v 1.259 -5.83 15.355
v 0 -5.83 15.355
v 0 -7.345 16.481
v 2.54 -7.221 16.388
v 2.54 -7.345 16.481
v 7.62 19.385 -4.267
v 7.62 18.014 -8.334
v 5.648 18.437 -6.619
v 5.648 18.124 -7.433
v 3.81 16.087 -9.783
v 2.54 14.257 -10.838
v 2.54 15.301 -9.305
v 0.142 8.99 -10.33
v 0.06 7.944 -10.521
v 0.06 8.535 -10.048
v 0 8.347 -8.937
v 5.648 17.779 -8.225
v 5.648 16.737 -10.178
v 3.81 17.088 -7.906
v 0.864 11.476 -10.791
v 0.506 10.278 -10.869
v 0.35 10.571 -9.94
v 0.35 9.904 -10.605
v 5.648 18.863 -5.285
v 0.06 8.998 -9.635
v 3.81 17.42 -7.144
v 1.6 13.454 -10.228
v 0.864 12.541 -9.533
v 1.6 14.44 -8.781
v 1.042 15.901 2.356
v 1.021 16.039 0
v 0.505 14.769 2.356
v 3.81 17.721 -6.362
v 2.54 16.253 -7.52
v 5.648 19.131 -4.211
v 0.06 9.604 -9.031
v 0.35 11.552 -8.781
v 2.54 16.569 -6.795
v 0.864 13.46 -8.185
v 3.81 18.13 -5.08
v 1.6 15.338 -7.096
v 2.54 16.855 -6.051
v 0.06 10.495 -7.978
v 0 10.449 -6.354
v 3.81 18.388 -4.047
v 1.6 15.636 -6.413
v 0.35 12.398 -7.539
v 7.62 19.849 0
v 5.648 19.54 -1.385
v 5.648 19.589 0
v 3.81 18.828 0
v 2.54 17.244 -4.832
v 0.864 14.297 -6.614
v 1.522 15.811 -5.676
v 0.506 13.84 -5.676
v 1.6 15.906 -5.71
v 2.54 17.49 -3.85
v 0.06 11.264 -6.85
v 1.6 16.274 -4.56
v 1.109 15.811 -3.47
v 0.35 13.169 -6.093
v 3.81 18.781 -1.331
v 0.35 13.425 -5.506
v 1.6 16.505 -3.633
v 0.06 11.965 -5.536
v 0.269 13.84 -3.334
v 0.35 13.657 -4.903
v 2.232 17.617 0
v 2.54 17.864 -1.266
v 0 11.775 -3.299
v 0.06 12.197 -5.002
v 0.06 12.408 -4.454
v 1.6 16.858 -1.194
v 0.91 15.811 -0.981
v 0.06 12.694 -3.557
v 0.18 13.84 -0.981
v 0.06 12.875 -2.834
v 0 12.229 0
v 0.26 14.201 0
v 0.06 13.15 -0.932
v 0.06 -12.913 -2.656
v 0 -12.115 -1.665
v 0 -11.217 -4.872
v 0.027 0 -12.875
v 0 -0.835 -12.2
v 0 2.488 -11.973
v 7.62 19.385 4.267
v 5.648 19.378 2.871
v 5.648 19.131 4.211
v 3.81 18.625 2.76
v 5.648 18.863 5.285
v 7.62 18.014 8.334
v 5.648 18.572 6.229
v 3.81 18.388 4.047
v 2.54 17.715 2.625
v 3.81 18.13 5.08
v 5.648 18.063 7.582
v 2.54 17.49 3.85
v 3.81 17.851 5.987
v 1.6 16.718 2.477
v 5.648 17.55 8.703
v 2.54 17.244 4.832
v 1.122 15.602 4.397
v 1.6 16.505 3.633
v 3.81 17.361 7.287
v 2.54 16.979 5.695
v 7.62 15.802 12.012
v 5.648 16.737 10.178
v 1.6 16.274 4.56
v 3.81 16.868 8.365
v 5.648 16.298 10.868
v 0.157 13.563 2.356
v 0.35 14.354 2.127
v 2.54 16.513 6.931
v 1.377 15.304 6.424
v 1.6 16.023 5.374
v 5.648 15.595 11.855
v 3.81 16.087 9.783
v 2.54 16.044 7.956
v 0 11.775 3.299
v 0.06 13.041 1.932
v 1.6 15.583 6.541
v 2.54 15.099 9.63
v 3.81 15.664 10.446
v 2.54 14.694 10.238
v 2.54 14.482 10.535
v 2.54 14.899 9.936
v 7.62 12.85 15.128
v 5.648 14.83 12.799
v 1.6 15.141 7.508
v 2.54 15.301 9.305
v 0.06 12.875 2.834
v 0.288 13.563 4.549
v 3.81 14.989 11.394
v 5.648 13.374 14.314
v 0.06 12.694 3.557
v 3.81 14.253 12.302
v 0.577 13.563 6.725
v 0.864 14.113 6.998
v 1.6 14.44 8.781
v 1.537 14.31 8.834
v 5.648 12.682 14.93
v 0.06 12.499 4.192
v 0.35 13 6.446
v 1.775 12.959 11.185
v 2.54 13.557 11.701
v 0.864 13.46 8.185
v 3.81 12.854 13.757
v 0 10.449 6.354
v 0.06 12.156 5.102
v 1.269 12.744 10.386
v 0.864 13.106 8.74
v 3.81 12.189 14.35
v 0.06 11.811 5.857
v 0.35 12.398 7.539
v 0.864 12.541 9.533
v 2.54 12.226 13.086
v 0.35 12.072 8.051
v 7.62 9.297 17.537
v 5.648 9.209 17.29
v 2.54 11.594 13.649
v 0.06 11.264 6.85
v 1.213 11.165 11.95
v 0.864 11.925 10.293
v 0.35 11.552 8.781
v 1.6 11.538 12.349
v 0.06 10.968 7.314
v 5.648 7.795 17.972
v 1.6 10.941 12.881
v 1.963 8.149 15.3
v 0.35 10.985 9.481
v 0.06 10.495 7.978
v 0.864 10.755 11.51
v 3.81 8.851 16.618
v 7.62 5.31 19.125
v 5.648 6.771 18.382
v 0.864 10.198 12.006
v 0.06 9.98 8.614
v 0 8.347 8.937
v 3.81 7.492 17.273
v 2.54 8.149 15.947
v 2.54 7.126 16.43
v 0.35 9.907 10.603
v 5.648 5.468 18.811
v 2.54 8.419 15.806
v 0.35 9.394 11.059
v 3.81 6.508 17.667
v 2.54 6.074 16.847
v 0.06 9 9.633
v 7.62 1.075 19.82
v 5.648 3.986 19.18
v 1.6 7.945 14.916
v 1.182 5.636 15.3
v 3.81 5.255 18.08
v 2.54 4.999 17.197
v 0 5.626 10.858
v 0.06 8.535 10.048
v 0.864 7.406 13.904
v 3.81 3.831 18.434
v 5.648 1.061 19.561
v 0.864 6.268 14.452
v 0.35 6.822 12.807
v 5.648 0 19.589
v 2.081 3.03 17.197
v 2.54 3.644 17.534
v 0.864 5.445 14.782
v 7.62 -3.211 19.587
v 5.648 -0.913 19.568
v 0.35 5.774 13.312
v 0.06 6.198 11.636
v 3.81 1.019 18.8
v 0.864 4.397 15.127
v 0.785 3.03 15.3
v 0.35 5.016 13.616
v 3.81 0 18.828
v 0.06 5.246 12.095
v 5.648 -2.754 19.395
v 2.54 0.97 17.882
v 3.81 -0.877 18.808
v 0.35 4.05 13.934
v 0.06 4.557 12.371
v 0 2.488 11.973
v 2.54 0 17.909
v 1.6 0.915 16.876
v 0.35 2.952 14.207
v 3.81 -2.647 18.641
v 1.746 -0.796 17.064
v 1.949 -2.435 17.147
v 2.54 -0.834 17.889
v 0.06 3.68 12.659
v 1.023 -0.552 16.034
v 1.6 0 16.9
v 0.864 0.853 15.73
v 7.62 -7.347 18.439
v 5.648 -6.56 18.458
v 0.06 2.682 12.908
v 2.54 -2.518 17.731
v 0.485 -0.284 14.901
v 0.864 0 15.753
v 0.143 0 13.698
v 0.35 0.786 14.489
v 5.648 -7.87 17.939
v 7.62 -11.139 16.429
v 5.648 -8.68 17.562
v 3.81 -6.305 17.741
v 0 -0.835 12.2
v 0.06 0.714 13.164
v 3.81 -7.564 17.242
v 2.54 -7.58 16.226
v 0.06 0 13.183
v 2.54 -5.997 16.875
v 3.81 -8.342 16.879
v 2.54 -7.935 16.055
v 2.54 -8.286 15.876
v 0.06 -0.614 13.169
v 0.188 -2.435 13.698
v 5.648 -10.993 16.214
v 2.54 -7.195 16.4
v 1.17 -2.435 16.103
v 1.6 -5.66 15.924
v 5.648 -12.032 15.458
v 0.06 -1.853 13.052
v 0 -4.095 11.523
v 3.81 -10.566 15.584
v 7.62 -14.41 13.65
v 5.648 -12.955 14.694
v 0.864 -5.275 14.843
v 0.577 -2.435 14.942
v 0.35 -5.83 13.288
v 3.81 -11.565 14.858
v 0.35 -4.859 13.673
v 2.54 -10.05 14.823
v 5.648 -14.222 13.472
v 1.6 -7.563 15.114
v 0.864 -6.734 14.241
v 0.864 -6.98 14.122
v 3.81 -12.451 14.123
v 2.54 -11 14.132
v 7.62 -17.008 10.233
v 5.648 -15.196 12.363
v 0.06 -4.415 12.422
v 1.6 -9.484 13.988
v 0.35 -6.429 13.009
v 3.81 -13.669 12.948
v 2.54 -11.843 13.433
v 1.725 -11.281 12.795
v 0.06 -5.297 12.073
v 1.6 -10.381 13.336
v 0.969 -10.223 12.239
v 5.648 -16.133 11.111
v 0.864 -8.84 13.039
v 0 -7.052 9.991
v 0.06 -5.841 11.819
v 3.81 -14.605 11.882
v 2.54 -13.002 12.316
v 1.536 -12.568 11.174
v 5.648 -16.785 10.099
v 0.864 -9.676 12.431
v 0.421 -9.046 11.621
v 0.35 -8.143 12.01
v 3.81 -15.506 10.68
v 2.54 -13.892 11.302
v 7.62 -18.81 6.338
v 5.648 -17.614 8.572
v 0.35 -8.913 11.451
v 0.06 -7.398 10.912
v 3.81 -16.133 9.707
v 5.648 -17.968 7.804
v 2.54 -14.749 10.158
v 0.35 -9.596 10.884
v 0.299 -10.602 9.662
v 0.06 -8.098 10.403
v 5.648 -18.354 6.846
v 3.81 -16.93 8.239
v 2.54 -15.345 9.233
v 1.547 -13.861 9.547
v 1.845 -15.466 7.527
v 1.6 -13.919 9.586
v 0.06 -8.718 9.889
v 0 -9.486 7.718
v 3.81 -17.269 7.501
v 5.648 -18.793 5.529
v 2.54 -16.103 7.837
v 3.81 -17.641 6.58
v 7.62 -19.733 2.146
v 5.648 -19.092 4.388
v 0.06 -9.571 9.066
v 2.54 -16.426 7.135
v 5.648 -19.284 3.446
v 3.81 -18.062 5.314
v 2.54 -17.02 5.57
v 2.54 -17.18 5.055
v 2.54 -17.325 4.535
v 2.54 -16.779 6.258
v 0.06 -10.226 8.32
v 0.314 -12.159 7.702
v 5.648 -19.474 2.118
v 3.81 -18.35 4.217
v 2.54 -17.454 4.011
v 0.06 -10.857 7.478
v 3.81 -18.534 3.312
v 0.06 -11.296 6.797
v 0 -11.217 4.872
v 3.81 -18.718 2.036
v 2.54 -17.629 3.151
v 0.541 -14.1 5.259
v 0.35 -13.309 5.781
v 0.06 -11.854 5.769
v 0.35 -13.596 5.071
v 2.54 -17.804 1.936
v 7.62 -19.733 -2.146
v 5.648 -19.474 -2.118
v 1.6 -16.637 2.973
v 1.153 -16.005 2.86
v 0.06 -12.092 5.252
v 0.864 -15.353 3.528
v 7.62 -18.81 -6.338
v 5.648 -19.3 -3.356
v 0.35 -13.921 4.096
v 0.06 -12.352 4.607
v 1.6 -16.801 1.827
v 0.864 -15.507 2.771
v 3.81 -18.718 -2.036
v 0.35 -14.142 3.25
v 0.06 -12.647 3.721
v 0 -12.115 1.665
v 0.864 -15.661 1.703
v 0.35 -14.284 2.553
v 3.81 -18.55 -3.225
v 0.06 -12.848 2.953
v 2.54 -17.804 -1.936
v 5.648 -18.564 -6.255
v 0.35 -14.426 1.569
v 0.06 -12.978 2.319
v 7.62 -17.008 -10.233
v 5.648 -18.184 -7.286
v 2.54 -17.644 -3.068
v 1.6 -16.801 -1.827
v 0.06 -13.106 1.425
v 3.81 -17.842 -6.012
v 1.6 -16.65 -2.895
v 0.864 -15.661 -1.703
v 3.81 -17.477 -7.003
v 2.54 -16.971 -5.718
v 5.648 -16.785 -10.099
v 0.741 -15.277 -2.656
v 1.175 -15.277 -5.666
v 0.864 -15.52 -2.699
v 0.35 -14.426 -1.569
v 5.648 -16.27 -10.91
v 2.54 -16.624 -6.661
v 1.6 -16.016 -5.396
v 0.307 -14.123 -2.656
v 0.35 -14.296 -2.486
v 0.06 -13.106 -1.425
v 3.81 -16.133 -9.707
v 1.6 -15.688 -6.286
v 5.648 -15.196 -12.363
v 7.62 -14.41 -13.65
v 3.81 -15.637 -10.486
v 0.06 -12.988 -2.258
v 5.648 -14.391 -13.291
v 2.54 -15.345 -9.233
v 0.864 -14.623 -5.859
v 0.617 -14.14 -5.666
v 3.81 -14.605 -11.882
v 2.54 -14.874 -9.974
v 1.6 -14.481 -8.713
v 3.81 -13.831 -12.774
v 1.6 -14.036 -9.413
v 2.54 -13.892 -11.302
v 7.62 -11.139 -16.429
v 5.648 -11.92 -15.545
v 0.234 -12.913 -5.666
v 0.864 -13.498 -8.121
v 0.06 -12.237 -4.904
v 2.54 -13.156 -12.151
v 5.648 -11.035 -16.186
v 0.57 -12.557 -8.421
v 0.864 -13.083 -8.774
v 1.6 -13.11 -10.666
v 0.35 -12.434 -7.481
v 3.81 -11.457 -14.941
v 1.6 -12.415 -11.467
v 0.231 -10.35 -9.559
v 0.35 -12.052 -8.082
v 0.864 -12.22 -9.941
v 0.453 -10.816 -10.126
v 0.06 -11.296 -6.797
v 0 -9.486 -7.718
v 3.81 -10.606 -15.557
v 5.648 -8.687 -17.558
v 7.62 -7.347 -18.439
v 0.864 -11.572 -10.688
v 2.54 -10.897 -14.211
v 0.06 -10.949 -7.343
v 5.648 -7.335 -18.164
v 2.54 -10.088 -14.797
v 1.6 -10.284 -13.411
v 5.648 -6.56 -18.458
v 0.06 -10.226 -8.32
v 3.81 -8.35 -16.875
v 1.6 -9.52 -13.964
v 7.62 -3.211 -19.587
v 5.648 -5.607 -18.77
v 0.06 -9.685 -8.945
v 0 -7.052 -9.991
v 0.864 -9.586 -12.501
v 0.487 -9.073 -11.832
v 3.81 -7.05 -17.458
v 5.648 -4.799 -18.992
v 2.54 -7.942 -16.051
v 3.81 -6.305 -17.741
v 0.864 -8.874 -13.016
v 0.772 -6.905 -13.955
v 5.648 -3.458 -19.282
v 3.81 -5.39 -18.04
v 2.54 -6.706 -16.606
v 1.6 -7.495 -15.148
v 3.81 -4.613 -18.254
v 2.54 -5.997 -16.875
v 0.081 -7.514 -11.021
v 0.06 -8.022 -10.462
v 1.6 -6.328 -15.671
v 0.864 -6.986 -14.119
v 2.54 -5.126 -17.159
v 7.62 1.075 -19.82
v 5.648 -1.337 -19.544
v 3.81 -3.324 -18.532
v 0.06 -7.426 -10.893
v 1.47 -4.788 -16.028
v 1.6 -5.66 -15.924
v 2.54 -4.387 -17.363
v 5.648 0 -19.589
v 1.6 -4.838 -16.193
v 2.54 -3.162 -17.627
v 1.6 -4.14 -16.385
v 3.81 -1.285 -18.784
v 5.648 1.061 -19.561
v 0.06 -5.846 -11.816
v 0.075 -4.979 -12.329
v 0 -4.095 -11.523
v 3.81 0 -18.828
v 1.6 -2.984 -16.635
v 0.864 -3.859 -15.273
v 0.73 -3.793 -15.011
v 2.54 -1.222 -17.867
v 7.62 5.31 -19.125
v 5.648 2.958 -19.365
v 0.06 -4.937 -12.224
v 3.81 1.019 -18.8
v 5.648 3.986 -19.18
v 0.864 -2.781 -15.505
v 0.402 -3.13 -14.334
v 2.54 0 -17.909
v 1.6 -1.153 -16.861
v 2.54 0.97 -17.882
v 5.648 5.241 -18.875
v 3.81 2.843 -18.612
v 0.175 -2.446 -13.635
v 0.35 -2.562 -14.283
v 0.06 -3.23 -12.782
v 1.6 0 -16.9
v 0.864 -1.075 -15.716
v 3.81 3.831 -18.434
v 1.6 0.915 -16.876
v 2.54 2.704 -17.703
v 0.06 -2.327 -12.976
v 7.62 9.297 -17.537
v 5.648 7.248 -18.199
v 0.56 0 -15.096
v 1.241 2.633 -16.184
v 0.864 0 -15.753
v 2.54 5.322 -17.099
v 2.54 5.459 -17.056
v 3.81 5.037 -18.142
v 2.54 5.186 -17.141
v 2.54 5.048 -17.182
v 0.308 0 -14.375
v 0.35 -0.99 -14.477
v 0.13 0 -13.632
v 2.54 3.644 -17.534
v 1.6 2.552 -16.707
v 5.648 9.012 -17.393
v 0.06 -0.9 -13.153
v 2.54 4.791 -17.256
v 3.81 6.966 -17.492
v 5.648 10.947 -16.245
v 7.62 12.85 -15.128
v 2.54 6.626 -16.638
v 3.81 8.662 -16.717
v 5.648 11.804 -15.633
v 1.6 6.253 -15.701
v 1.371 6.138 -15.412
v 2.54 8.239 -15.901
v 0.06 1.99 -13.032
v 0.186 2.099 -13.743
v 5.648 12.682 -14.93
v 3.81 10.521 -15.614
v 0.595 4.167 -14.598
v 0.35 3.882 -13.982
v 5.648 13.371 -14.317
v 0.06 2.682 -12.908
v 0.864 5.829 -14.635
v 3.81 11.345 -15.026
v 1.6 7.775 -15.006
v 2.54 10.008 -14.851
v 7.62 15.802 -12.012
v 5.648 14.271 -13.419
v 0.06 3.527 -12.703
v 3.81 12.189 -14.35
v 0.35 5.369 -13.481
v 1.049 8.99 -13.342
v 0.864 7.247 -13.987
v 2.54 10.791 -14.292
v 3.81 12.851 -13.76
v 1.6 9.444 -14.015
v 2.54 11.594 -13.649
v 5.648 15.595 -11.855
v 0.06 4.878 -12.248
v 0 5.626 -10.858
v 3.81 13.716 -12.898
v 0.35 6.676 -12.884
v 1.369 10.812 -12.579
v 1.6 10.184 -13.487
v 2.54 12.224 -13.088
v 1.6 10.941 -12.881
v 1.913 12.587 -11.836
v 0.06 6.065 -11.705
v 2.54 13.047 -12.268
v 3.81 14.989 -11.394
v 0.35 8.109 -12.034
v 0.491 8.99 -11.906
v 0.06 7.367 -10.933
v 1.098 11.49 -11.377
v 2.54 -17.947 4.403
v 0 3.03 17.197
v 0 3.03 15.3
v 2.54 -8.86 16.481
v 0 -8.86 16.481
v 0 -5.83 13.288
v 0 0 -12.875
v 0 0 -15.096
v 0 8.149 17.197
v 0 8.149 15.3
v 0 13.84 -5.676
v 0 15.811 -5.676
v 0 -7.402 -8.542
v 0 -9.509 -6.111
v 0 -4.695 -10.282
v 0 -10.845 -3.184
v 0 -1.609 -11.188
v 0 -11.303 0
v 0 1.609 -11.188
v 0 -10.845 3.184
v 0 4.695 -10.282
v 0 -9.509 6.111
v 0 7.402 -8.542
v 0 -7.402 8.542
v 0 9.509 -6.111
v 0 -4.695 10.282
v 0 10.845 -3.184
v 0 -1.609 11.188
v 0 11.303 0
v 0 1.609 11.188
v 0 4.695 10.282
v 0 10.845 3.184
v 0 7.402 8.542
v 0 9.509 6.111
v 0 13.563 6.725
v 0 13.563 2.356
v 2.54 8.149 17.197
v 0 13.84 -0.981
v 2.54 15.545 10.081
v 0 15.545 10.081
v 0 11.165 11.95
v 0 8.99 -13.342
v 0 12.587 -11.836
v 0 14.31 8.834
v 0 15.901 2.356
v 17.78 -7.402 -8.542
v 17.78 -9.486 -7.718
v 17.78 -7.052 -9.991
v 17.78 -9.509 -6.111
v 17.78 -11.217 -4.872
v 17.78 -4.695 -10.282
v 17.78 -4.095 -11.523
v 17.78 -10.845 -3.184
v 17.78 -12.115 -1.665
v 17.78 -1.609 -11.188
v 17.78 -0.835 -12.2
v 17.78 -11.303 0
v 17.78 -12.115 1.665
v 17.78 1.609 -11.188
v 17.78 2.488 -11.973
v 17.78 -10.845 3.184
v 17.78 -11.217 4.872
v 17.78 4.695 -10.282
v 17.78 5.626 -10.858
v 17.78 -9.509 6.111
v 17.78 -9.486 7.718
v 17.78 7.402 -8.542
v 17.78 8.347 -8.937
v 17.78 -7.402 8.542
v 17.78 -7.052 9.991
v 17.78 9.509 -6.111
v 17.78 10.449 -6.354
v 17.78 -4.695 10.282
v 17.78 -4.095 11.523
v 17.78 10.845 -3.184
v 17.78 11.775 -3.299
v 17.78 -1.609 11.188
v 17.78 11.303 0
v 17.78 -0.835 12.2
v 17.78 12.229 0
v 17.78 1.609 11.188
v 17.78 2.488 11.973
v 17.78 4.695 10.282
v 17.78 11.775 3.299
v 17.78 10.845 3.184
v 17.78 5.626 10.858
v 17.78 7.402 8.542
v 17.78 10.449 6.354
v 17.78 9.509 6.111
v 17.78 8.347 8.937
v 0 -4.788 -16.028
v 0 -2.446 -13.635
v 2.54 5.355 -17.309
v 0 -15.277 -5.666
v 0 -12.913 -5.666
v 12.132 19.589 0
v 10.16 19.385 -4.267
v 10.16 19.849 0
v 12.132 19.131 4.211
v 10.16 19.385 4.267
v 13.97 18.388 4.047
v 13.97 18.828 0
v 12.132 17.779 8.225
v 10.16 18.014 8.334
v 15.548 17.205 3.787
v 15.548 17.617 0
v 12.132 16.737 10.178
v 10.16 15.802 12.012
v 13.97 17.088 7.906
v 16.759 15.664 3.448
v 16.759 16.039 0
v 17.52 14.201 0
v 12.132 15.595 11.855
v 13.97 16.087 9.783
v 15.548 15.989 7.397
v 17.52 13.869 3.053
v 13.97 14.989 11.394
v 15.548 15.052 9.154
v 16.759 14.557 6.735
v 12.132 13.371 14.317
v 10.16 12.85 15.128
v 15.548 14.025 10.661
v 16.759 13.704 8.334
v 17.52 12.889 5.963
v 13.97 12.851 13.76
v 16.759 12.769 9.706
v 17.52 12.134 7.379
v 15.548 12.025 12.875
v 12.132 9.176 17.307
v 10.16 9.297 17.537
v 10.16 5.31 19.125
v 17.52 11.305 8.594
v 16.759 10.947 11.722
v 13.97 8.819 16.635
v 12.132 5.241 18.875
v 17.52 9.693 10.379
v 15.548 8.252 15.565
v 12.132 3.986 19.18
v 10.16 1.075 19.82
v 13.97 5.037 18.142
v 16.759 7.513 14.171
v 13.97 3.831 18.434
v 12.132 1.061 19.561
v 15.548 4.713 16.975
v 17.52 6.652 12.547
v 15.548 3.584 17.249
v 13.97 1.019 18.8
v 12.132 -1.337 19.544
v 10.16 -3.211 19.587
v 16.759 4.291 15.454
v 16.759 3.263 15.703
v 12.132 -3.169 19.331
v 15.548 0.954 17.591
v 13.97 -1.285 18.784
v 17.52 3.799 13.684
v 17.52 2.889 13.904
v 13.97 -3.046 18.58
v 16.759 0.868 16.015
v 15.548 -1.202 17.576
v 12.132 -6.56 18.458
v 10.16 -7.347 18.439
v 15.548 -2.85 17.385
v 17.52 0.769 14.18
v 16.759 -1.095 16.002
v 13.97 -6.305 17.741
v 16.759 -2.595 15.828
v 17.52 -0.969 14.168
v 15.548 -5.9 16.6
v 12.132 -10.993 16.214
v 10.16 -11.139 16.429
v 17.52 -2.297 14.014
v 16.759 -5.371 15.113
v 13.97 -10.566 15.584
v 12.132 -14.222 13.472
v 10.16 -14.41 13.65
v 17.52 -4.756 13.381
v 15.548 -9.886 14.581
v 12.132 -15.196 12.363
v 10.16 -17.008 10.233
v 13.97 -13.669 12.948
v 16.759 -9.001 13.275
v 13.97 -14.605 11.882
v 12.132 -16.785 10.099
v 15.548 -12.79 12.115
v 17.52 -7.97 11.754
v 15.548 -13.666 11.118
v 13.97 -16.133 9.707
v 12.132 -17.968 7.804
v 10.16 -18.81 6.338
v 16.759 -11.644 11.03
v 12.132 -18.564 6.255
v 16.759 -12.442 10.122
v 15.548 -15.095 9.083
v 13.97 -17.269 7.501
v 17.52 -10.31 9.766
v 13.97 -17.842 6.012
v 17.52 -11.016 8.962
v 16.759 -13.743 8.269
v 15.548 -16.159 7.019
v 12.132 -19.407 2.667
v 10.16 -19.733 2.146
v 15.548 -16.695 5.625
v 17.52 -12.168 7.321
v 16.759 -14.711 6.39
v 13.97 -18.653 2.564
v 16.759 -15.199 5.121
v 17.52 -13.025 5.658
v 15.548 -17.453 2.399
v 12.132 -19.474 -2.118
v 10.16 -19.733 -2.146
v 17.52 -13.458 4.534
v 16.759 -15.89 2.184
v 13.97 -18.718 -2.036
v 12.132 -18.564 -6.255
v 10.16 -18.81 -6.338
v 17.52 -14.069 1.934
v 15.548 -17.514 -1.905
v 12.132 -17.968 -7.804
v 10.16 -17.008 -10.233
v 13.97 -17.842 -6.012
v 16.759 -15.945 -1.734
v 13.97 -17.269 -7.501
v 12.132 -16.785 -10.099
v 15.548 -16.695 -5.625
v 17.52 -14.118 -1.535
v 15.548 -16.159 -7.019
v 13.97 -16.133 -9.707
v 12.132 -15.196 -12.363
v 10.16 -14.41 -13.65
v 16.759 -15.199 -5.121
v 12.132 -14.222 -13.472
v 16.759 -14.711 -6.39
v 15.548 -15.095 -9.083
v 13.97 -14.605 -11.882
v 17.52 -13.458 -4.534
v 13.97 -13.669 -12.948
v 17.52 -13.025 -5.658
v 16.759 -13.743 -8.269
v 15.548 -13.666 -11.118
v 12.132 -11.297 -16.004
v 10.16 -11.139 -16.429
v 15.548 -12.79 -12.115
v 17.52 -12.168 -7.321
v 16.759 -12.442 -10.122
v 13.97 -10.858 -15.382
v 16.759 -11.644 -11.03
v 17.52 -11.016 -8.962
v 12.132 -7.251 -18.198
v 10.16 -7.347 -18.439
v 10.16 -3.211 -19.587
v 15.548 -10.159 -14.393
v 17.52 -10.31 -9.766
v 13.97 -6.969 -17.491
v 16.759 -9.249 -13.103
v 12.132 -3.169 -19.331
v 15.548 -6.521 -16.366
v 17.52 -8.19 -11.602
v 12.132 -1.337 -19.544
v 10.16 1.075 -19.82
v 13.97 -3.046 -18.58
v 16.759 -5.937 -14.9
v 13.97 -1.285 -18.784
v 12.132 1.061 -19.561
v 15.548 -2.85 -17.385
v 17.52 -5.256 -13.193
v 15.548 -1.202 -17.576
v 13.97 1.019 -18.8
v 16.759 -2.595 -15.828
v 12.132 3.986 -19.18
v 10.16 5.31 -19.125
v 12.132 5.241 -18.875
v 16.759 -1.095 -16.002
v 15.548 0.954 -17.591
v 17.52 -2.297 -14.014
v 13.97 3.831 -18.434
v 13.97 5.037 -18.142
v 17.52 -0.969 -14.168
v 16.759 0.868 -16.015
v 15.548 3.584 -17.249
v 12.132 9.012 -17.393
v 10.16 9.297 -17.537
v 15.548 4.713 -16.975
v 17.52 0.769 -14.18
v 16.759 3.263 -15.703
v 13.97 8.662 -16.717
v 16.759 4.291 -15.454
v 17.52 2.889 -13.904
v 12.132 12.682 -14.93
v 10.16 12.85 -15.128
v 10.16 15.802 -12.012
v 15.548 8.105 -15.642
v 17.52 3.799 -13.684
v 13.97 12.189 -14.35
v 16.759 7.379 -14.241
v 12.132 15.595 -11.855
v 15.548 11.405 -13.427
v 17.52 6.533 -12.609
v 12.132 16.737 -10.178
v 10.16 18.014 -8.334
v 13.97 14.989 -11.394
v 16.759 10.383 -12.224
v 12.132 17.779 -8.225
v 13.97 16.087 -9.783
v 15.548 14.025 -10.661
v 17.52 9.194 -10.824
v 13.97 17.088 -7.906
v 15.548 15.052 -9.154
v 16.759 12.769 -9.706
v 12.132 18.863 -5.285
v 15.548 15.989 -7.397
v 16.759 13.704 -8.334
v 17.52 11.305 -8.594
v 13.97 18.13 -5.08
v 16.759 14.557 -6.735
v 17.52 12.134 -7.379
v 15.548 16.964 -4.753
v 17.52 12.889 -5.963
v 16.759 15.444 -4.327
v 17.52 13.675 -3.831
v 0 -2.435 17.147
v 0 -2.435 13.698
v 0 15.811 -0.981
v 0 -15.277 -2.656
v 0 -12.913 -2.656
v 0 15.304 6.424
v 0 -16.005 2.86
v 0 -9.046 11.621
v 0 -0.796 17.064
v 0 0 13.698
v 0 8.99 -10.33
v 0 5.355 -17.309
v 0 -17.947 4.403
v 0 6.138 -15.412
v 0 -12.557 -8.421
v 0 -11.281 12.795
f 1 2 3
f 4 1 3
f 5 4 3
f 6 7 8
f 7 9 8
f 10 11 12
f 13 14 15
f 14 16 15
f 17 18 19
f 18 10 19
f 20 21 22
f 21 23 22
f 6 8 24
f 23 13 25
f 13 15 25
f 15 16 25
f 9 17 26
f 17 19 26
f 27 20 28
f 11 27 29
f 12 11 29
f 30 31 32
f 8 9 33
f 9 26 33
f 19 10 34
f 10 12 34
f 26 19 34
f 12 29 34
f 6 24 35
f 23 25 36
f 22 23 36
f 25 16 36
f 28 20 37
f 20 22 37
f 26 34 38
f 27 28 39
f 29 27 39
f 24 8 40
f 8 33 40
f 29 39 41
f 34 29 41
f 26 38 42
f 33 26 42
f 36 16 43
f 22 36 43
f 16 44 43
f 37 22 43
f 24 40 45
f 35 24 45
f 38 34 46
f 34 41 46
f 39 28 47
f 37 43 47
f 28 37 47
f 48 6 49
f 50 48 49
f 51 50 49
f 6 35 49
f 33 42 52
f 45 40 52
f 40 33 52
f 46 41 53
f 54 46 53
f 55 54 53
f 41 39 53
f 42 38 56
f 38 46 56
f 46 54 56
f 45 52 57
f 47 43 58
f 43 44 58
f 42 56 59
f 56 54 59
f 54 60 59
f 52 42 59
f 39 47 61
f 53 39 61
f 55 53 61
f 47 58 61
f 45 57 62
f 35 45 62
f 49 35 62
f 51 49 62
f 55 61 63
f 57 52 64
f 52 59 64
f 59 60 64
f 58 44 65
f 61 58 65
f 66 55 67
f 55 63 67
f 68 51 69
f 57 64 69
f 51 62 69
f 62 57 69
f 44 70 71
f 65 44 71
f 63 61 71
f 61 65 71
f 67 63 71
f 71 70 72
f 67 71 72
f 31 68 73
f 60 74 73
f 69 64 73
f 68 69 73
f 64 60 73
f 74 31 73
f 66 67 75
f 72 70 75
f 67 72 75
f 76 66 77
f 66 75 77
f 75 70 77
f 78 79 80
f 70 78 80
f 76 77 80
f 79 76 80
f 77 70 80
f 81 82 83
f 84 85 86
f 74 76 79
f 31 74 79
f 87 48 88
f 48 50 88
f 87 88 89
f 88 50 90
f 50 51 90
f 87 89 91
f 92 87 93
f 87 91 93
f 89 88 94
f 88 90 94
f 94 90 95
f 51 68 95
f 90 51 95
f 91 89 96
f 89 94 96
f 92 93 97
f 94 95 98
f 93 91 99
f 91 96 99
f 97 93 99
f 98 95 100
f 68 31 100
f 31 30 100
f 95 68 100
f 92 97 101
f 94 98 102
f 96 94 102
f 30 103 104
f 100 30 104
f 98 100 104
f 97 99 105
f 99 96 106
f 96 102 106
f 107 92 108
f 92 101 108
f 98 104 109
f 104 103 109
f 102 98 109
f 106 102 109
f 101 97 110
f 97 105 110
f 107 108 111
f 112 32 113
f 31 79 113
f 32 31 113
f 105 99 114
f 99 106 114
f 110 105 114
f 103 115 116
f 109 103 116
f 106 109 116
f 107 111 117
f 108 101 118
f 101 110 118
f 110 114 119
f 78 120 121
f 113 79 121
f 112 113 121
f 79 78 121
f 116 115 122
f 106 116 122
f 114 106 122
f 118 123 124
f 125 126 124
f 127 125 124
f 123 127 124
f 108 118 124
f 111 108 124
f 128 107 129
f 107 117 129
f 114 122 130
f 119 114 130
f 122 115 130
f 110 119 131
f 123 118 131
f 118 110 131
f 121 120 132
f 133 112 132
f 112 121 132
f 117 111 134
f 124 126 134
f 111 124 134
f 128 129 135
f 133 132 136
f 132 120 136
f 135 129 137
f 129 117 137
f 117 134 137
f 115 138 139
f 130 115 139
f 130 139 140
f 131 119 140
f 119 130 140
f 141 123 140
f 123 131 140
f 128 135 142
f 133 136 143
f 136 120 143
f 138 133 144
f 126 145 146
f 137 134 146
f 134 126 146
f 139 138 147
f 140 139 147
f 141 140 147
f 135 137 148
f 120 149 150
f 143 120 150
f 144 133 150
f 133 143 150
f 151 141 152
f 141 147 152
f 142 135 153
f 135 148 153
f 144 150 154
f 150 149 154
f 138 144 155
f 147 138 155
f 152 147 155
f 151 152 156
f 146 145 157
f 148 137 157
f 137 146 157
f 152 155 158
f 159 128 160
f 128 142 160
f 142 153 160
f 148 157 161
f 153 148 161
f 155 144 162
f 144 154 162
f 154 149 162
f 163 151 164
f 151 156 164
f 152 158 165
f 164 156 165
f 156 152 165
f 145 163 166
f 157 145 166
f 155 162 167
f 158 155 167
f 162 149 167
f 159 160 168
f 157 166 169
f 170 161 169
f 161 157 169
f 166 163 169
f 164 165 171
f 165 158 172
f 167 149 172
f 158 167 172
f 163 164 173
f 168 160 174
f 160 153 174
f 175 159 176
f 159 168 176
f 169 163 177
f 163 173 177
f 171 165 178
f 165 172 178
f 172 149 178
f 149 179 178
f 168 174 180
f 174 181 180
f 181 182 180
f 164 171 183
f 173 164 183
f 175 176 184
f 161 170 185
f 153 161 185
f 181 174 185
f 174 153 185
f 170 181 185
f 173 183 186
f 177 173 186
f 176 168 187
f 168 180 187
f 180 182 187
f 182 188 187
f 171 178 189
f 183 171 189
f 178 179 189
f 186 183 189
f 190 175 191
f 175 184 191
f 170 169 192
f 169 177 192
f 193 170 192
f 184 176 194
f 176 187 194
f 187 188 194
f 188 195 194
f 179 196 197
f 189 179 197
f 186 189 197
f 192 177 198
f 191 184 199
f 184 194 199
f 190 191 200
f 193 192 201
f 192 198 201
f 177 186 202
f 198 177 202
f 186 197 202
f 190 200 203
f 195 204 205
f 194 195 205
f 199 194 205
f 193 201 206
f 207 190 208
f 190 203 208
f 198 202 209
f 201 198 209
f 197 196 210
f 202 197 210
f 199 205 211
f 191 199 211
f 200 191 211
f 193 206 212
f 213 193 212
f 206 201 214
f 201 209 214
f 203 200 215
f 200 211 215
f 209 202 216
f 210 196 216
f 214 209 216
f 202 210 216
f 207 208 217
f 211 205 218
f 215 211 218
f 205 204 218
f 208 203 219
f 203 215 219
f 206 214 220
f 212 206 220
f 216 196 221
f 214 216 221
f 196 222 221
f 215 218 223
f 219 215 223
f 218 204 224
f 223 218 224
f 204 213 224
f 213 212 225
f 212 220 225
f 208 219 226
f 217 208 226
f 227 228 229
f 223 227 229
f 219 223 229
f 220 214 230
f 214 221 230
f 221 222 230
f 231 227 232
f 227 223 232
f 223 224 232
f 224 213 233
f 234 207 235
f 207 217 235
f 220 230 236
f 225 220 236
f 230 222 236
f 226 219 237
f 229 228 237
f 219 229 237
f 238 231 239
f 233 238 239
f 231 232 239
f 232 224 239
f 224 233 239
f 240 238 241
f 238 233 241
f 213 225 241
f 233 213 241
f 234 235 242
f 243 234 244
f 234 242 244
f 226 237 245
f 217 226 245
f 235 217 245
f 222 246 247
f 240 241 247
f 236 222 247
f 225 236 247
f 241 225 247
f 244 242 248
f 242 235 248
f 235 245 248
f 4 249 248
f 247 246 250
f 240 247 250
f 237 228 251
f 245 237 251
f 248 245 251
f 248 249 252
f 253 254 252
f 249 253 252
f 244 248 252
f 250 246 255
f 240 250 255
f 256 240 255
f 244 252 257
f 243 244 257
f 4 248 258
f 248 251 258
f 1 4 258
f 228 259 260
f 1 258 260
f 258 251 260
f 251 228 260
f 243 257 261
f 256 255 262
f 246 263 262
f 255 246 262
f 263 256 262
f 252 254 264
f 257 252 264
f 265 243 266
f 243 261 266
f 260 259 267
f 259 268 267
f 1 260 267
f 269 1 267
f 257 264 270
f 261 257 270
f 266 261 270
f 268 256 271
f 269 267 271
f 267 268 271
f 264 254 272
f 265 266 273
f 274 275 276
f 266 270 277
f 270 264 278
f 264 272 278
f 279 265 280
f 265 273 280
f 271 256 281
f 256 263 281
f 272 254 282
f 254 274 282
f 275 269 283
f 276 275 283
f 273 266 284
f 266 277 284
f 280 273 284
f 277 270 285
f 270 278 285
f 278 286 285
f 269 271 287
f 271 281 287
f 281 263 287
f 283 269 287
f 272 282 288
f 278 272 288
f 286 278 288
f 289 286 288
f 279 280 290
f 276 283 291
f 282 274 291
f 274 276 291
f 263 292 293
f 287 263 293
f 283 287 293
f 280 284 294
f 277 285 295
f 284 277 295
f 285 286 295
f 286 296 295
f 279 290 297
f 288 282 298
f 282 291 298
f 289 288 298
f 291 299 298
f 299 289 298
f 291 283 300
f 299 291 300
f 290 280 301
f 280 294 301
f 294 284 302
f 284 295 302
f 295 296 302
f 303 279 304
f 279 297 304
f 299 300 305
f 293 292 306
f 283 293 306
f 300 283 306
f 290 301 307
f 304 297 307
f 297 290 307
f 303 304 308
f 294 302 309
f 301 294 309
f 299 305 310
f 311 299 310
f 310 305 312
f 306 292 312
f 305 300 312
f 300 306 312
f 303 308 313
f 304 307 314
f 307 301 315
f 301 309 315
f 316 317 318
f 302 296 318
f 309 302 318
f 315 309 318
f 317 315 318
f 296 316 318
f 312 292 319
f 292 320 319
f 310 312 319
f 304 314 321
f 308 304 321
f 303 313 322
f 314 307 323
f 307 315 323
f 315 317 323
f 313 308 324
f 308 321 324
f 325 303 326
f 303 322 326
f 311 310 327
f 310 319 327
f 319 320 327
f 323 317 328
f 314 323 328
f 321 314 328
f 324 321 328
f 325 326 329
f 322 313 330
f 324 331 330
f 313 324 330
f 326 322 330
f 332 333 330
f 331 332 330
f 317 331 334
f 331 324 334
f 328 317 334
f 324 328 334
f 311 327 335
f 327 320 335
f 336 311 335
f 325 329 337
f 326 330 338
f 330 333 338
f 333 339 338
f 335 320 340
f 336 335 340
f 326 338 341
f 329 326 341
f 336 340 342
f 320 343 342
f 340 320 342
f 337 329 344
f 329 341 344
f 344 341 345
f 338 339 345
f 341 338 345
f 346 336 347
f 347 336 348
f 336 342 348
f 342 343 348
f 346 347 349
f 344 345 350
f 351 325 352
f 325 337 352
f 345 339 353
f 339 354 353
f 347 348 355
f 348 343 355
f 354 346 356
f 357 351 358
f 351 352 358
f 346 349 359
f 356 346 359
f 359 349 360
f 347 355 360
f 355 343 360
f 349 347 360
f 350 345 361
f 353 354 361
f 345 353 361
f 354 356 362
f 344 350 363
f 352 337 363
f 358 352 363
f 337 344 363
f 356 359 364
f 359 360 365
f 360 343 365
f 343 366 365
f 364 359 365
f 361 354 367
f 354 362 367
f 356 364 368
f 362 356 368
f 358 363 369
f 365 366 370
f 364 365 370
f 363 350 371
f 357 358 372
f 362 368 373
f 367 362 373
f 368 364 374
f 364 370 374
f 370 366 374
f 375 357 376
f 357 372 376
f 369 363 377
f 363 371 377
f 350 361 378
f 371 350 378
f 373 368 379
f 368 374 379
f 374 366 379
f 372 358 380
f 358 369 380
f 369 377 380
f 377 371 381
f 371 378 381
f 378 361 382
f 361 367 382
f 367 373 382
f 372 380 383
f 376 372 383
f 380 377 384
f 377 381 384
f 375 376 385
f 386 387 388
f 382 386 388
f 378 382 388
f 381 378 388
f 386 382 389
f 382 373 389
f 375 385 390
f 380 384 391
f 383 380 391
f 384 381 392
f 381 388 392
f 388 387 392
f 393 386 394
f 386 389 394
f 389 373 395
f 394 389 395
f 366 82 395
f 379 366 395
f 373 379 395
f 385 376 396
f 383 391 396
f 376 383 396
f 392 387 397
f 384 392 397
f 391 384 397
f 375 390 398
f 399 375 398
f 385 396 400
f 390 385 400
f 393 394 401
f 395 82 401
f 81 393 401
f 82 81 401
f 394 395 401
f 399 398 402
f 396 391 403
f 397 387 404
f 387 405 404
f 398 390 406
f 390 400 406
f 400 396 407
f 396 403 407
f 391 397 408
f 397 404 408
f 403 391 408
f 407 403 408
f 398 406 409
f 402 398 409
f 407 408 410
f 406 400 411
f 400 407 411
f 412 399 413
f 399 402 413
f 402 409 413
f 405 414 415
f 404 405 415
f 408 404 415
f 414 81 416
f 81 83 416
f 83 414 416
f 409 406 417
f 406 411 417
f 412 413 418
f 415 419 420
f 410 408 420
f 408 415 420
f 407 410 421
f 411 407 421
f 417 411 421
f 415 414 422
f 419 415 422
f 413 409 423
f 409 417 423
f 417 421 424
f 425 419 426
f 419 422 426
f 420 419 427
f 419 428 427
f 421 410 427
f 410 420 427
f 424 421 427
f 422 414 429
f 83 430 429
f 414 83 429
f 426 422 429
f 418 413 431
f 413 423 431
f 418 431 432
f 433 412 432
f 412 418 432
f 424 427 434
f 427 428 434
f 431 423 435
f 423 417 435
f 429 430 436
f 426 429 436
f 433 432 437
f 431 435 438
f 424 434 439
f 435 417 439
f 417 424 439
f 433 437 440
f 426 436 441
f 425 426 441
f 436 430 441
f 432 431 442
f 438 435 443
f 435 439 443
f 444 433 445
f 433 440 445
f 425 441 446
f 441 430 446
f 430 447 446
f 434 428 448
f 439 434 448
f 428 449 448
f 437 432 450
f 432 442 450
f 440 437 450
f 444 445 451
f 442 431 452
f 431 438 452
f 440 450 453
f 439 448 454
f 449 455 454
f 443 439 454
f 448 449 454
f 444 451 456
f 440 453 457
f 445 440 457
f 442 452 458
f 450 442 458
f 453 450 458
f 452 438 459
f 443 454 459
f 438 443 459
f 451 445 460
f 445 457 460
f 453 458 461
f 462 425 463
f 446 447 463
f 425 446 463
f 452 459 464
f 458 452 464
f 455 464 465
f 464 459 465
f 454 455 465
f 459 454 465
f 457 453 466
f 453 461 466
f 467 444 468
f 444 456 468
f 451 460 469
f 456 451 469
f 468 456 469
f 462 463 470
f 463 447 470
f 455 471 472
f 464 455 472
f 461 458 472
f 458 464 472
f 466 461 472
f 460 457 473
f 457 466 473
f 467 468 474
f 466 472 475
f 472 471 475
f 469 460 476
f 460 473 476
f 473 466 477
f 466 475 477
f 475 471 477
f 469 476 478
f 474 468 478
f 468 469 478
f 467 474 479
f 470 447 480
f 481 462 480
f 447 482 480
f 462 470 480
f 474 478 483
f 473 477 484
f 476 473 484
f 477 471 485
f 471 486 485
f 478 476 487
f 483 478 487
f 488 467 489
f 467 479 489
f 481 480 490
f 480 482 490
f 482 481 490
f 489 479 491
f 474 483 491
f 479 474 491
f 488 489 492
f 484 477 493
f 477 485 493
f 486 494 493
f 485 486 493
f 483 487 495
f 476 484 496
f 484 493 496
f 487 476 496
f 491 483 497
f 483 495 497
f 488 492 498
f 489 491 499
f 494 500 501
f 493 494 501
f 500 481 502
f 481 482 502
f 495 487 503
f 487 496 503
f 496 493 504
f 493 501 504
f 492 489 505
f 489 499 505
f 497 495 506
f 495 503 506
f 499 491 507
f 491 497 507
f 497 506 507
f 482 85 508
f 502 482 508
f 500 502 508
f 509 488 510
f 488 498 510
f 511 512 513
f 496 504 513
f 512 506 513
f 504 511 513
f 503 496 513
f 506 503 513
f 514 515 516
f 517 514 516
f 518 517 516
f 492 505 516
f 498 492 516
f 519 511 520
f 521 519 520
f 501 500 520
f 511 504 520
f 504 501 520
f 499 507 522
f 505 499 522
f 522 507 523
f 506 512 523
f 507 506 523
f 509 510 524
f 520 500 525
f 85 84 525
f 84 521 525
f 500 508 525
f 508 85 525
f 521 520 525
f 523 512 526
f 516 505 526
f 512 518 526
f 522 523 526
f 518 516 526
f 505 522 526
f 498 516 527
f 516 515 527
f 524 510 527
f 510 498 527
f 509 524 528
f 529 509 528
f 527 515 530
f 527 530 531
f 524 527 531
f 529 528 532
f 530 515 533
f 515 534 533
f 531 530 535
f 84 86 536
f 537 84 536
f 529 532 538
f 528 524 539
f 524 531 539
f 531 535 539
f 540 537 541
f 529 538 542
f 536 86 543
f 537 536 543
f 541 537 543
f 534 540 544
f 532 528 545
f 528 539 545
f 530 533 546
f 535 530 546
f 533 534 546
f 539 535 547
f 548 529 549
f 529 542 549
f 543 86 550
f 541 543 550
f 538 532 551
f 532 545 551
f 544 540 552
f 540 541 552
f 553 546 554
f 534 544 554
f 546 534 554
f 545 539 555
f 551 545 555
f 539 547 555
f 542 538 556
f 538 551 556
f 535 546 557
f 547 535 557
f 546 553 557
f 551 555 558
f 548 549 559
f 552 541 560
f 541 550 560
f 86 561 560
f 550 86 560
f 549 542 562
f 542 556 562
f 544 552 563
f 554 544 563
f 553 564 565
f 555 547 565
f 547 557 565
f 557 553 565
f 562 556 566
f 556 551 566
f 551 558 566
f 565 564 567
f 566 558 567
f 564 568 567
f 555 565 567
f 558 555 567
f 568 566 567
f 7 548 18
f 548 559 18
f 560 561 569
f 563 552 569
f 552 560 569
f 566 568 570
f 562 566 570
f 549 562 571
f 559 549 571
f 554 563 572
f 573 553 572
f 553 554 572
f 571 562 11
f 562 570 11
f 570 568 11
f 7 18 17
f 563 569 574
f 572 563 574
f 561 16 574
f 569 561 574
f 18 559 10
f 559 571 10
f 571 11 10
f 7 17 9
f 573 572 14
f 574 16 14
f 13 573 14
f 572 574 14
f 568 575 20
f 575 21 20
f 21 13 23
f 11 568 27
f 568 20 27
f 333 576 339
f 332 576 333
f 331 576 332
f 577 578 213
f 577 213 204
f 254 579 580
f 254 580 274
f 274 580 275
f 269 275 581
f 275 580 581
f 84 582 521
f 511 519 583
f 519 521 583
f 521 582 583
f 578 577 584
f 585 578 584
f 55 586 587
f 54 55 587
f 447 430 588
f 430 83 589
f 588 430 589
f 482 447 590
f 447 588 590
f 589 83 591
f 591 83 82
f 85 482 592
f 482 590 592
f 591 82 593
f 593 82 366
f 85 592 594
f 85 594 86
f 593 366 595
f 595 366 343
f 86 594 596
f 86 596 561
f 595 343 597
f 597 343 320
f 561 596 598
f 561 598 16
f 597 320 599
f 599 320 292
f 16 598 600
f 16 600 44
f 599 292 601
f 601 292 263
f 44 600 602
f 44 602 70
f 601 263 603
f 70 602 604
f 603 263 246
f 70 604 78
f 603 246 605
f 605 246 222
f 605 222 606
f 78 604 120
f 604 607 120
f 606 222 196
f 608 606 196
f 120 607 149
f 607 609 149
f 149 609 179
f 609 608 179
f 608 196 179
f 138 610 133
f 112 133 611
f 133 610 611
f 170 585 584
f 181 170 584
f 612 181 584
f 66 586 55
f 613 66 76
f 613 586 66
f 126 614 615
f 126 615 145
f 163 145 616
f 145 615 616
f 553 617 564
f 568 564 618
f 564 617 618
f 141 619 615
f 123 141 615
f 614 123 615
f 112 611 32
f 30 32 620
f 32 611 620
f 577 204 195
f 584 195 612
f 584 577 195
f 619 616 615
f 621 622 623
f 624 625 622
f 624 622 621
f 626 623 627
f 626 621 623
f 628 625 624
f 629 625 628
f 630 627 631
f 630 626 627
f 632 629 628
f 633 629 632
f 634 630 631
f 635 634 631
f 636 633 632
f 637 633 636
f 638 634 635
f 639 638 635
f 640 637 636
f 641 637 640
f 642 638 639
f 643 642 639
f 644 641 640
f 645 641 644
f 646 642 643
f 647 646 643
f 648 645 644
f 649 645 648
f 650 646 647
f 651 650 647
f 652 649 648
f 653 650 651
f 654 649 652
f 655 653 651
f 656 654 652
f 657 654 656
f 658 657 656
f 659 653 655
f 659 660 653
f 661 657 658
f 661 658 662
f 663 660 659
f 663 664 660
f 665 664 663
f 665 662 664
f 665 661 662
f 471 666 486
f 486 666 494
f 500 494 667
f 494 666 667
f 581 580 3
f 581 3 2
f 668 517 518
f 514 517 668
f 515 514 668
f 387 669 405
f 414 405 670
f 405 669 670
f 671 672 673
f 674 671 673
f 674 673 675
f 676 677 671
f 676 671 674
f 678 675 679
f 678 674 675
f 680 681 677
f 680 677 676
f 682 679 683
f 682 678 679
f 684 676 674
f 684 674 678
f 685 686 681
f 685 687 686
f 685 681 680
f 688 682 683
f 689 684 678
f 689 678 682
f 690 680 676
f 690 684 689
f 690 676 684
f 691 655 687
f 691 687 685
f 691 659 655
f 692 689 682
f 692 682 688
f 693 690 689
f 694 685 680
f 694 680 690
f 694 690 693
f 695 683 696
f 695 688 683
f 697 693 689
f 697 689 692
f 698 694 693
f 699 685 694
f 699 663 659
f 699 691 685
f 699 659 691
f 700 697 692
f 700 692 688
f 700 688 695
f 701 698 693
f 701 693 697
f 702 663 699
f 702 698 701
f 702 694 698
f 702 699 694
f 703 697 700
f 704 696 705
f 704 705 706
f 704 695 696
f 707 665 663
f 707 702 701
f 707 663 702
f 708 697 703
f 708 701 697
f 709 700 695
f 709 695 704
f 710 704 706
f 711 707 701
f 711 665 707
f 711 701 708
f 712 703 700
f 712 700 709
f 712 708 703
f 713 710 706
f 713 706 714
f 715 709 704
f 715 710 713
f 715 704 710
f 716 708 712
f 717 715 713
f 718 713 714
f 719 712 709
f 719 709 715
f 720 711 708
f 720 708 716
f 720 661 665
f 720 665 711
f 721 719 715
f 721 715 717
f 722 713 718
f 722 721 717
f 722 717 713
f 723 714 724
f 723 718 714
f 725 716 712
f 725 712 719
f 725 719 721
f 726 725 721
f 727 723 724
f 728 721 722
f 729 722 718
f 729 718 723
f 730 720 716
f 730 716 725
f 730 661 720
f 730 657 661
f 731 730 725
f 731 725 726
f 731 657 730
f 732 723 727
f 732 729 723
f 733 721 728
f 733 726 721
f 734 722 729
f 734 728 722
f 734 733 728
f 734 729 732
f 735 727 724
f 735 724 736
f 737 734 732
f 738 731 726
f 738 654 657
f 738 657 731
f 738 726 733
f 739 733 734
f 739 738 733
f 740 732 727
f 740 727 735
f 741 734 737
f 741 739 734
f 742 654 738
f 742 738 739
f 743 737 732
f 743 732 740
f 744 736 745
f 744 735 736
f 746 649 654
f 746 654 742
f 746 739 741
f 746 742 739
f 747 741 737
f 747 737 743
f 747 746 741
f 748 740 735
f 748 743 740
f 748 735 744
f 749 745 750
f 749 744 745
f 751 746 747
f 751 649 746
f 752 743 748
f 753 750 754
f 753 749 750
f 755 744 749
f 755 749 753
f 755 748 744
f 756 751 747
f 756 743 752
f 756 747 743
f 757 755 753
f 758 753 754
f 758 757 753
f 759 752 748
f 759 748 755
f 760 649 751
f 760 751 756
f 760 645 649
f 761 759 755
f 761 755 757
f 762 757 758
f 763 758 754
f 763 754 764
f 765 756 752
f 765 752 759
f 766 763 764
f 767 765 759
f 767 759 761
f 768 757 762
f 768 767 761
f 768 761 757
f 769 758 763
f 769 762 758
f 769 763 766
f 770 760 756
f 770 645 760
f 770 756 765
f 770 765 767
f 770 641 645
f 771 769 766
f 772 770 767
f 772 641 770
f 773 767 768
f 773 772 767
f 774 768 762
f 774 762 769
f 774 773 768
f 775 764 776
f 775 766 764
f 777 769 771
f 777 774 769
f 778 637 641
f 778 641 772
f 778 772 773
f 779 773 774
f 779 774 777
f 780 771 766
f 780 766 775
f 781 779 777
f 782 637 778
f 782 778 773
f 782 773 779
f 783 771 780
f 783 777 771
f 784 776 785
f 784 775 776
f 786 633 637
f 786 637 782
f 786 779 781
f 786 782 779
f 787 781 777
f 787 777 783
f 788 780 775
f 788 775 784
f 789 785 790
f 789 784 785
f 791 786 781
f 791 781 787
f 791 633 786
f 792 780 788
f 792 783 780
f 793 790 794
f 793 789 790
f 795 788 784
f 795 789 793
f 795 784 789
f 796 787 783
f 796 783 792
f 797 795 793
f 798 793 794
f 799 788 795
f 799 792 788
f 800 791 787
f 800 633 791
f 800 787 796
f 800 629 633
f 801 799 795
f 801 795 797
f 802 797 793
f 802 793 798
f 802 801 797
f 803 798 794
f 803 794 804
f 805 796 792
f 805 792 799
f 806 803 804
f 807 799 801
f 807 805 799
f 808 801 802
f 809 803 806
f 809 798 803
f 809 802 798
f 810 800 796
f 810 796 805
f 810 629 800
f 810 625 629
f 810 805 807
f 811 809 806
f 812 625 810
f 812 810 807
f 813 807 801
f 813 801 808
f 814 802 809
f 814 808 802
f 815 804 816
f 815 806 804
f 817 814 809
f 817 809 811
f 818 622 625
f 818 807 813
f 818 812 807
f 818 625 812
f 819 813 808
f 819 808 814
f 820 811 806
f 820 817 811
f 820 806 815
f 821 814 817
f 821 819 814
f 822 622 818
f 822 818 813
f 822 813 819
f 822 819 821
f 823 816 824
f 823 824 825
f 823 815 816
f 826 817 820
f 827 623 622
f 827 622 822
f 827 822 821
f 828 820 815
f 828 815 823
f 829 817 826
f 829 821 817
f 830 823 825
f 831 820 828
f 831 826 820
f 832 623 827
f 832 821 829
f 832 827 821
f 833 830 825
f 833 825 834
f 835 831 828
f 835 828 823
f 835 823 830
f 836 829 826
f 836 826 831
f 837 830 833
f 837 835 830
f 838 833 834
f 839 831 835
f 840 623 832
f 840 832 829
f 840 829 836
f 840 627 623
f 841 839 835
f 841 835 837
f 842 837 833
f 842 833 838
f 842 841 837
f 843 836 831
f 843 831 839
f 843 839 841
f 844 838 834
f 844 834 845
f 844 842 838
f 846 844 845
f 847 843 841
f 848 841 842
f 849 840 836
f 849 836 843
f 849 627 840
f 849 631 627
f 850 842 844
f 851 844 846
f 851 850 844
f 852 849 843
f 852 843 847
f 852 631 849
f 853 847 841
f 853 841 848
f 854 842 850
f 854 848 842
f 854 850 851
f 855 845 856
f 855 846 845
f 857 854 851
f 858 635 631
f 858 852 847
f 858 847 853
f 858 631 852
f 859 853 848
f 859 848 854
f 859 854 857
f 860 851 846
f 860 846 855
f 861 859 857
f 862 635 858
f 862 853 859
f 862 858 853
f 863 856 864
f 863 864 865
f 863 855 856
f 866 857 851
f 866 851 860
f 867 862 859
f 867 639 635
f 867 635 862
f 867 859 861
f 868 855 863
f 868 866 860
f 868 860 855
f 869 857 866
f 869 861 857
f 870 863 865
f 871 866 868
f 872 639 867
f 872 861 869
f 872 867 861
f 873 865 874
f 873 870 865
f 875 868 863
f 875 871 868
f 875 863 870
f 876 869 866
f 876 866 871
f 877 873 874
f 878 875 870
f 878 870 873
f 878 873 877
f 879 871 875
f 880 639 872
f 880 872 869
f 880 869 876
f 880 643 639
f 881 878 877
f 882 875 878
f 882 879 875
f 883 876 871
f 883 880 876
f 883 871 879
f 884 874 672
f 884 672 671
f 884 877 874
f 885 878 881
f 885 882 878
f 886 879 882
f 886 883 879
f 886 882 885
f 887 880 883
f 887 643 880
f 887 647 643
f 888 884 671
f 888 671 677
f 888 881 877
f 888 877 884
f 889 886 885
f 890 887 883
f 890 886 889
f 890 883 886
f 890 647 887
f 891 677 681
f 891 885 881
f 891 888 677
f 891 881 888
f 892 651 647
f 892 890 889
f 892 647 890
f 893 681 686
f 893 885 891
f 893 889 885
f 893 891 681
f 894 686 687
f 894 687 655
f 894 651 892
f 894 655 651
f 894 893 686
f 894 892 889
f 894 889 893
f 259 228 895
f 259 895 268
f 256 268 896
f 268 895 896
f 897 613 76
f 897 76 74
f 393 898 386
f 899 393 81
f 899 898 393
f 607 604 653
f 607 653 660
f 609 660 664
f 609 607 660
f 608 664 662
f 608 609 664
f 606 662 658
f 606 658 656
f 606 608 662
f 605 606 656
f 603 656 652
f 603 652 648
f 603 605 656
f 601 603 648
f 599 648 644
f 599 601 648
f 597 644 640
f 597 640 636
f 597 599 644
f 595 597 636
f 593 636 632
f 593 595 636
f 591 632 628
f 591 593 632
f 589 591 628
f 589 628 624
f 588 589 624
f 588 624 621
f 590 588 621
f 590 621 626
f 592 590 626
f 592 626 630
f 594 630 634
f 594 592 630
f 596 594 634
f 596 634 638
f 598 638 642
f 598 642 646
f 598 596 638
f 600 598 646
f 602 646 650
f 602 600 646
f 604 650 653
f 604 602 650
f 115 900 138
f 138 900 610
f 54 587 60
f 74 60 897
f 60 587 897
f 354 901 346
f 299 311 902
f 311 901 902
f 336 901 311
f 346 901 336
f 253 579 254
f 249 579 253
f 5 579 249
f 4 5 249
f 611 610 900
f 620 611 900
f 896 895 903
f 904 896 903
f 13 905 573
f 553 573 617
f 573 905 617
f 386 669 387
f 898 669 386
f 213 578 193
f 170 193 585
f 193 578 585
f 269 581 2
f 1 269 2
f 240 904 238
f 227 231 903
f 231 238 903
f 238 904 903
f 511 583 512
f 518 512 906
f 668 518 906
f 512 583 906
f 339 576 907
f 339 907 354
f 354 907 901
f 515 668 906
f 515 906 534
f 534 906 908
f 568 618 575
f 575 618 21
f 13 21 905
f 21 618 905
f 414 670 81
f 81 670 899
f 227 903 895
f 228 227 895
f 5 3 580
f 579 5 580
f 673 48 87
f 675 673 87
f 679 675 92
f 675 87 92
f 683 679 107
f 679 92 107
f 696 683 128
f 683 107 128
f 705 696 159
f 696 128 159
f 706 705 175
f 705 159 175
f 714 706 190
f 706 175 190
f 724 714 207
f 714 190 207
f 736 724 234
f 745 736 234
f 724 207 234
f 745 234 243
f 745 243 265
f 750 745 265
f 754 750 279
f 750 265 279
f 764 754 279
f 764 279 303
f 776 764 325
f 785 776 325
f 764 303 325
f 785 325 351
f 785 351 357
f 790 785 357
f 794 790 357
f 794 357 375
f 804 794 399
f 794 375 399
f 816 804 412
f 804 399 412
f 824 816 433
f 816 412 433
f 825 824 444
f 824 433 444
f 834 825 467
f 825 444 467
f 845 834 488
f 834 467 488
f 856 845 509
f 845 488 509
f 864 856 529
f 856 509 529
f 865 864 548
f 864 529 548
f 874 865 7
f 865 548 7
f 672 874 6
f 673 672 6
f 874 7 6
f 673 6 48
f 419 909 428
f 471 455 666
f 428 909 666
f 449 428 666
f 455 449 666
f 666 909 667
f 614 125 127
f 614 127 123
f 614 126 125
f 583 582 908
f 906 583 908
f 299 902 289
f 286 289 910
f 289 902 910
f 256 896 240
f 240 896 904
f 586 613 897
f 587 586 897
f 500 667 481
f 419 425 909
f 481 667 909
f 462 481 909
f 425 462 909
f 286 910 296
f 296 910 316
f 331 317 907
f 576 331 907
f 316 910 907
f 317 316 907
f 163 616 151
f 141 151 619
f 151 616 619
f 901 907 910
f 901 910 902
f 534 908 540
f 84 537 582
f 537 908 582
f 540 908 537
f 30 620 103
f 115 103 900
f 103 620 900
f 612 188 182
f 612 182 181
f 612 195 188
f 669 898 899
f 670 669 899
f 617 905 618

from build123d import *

# Parameters (mm, degrees)
F0_R     = 19.848958
F0_R_2   = 11.303
F1_DEPTH = 17.78
F2_R     = 7.62
F3_W     = 5.119225
F3_H     = 1.897266
F3_W_2   = 1.970694
F3_H_2   = 4.695322
F3_W_3   = 2.363822
F3_H_3   = 3.009573
F4_DEPTH = 2.54


with BuildPart() as f1:
    # F0 (on Right) → F1 (new body)
    with BuildSketch(Plane.YZ):
        Circle(F0_R)
        Circle(F0_R_2, mode=Mode.SUBTRACT)
    extrude(amount=F1_DEPTH)

    # F2
    f2_edges = [f1.edges().sort_by_distance(p)[0] for p in [
        (17.78, -19.848958, 0),
        (0, -19.848958, 0),
    ]]
    fillet(f2_edges, radius=F2_R)

    # F3 (on Right) → F4 (join)
    with BuildSketch(Plane.YZ):
        Polygon((-16.004974, 2.860423), (-9.045522, 11.621134), (-11.280753, 12.795233), (-17.947224, 4.403334), align=None)
        Polygon((-7.344878, 16.480749), (-8.859969, 16.480749), (-5.829786, 13.28801), (-5.829786, 15.35471), align=None)
        Polygon((-0.795809, 17.064454), (-2.434773, 17.146636), (-2.434773, 13.698089), (0, 13.698089), align=None)
        with Locations((5.589543, 16.248173)):
            Rectangle(F3_W, F3_H)
        Polygon((15.545471, 10.081242), (11.165203, 11.949784), (14.310407, 8.834369), align=None)
        Polygon((15.304292, 6.423779), (13.562527, 6.725411), (13.562527, 2.356187), (15.901389, 2.356187), align=None)
        with Locations((14.825182, -3.328288)):
            Rectangle(F3_W_2, F3_H_2)
        Polygon((8.990117, -10.330278), (8.990117, -13.34158), (12.587023, -11.835929), align=None)
        Polygon((0, -12.875467), (0, -15.095817), (5.354564, -17.308898), (6.13836, -15.412497), align=None)
        Polygon((-2.445628, -13.634987), (-12.557364, -8.420914), (-4.788246, -16.027622), align=None)
        with Locations((-14.094844, -4.16113)):
            Rectangle(F3_W_3, F3_H_3)
    extrude(amount=F4_DEPTH)


solid = f1.part
